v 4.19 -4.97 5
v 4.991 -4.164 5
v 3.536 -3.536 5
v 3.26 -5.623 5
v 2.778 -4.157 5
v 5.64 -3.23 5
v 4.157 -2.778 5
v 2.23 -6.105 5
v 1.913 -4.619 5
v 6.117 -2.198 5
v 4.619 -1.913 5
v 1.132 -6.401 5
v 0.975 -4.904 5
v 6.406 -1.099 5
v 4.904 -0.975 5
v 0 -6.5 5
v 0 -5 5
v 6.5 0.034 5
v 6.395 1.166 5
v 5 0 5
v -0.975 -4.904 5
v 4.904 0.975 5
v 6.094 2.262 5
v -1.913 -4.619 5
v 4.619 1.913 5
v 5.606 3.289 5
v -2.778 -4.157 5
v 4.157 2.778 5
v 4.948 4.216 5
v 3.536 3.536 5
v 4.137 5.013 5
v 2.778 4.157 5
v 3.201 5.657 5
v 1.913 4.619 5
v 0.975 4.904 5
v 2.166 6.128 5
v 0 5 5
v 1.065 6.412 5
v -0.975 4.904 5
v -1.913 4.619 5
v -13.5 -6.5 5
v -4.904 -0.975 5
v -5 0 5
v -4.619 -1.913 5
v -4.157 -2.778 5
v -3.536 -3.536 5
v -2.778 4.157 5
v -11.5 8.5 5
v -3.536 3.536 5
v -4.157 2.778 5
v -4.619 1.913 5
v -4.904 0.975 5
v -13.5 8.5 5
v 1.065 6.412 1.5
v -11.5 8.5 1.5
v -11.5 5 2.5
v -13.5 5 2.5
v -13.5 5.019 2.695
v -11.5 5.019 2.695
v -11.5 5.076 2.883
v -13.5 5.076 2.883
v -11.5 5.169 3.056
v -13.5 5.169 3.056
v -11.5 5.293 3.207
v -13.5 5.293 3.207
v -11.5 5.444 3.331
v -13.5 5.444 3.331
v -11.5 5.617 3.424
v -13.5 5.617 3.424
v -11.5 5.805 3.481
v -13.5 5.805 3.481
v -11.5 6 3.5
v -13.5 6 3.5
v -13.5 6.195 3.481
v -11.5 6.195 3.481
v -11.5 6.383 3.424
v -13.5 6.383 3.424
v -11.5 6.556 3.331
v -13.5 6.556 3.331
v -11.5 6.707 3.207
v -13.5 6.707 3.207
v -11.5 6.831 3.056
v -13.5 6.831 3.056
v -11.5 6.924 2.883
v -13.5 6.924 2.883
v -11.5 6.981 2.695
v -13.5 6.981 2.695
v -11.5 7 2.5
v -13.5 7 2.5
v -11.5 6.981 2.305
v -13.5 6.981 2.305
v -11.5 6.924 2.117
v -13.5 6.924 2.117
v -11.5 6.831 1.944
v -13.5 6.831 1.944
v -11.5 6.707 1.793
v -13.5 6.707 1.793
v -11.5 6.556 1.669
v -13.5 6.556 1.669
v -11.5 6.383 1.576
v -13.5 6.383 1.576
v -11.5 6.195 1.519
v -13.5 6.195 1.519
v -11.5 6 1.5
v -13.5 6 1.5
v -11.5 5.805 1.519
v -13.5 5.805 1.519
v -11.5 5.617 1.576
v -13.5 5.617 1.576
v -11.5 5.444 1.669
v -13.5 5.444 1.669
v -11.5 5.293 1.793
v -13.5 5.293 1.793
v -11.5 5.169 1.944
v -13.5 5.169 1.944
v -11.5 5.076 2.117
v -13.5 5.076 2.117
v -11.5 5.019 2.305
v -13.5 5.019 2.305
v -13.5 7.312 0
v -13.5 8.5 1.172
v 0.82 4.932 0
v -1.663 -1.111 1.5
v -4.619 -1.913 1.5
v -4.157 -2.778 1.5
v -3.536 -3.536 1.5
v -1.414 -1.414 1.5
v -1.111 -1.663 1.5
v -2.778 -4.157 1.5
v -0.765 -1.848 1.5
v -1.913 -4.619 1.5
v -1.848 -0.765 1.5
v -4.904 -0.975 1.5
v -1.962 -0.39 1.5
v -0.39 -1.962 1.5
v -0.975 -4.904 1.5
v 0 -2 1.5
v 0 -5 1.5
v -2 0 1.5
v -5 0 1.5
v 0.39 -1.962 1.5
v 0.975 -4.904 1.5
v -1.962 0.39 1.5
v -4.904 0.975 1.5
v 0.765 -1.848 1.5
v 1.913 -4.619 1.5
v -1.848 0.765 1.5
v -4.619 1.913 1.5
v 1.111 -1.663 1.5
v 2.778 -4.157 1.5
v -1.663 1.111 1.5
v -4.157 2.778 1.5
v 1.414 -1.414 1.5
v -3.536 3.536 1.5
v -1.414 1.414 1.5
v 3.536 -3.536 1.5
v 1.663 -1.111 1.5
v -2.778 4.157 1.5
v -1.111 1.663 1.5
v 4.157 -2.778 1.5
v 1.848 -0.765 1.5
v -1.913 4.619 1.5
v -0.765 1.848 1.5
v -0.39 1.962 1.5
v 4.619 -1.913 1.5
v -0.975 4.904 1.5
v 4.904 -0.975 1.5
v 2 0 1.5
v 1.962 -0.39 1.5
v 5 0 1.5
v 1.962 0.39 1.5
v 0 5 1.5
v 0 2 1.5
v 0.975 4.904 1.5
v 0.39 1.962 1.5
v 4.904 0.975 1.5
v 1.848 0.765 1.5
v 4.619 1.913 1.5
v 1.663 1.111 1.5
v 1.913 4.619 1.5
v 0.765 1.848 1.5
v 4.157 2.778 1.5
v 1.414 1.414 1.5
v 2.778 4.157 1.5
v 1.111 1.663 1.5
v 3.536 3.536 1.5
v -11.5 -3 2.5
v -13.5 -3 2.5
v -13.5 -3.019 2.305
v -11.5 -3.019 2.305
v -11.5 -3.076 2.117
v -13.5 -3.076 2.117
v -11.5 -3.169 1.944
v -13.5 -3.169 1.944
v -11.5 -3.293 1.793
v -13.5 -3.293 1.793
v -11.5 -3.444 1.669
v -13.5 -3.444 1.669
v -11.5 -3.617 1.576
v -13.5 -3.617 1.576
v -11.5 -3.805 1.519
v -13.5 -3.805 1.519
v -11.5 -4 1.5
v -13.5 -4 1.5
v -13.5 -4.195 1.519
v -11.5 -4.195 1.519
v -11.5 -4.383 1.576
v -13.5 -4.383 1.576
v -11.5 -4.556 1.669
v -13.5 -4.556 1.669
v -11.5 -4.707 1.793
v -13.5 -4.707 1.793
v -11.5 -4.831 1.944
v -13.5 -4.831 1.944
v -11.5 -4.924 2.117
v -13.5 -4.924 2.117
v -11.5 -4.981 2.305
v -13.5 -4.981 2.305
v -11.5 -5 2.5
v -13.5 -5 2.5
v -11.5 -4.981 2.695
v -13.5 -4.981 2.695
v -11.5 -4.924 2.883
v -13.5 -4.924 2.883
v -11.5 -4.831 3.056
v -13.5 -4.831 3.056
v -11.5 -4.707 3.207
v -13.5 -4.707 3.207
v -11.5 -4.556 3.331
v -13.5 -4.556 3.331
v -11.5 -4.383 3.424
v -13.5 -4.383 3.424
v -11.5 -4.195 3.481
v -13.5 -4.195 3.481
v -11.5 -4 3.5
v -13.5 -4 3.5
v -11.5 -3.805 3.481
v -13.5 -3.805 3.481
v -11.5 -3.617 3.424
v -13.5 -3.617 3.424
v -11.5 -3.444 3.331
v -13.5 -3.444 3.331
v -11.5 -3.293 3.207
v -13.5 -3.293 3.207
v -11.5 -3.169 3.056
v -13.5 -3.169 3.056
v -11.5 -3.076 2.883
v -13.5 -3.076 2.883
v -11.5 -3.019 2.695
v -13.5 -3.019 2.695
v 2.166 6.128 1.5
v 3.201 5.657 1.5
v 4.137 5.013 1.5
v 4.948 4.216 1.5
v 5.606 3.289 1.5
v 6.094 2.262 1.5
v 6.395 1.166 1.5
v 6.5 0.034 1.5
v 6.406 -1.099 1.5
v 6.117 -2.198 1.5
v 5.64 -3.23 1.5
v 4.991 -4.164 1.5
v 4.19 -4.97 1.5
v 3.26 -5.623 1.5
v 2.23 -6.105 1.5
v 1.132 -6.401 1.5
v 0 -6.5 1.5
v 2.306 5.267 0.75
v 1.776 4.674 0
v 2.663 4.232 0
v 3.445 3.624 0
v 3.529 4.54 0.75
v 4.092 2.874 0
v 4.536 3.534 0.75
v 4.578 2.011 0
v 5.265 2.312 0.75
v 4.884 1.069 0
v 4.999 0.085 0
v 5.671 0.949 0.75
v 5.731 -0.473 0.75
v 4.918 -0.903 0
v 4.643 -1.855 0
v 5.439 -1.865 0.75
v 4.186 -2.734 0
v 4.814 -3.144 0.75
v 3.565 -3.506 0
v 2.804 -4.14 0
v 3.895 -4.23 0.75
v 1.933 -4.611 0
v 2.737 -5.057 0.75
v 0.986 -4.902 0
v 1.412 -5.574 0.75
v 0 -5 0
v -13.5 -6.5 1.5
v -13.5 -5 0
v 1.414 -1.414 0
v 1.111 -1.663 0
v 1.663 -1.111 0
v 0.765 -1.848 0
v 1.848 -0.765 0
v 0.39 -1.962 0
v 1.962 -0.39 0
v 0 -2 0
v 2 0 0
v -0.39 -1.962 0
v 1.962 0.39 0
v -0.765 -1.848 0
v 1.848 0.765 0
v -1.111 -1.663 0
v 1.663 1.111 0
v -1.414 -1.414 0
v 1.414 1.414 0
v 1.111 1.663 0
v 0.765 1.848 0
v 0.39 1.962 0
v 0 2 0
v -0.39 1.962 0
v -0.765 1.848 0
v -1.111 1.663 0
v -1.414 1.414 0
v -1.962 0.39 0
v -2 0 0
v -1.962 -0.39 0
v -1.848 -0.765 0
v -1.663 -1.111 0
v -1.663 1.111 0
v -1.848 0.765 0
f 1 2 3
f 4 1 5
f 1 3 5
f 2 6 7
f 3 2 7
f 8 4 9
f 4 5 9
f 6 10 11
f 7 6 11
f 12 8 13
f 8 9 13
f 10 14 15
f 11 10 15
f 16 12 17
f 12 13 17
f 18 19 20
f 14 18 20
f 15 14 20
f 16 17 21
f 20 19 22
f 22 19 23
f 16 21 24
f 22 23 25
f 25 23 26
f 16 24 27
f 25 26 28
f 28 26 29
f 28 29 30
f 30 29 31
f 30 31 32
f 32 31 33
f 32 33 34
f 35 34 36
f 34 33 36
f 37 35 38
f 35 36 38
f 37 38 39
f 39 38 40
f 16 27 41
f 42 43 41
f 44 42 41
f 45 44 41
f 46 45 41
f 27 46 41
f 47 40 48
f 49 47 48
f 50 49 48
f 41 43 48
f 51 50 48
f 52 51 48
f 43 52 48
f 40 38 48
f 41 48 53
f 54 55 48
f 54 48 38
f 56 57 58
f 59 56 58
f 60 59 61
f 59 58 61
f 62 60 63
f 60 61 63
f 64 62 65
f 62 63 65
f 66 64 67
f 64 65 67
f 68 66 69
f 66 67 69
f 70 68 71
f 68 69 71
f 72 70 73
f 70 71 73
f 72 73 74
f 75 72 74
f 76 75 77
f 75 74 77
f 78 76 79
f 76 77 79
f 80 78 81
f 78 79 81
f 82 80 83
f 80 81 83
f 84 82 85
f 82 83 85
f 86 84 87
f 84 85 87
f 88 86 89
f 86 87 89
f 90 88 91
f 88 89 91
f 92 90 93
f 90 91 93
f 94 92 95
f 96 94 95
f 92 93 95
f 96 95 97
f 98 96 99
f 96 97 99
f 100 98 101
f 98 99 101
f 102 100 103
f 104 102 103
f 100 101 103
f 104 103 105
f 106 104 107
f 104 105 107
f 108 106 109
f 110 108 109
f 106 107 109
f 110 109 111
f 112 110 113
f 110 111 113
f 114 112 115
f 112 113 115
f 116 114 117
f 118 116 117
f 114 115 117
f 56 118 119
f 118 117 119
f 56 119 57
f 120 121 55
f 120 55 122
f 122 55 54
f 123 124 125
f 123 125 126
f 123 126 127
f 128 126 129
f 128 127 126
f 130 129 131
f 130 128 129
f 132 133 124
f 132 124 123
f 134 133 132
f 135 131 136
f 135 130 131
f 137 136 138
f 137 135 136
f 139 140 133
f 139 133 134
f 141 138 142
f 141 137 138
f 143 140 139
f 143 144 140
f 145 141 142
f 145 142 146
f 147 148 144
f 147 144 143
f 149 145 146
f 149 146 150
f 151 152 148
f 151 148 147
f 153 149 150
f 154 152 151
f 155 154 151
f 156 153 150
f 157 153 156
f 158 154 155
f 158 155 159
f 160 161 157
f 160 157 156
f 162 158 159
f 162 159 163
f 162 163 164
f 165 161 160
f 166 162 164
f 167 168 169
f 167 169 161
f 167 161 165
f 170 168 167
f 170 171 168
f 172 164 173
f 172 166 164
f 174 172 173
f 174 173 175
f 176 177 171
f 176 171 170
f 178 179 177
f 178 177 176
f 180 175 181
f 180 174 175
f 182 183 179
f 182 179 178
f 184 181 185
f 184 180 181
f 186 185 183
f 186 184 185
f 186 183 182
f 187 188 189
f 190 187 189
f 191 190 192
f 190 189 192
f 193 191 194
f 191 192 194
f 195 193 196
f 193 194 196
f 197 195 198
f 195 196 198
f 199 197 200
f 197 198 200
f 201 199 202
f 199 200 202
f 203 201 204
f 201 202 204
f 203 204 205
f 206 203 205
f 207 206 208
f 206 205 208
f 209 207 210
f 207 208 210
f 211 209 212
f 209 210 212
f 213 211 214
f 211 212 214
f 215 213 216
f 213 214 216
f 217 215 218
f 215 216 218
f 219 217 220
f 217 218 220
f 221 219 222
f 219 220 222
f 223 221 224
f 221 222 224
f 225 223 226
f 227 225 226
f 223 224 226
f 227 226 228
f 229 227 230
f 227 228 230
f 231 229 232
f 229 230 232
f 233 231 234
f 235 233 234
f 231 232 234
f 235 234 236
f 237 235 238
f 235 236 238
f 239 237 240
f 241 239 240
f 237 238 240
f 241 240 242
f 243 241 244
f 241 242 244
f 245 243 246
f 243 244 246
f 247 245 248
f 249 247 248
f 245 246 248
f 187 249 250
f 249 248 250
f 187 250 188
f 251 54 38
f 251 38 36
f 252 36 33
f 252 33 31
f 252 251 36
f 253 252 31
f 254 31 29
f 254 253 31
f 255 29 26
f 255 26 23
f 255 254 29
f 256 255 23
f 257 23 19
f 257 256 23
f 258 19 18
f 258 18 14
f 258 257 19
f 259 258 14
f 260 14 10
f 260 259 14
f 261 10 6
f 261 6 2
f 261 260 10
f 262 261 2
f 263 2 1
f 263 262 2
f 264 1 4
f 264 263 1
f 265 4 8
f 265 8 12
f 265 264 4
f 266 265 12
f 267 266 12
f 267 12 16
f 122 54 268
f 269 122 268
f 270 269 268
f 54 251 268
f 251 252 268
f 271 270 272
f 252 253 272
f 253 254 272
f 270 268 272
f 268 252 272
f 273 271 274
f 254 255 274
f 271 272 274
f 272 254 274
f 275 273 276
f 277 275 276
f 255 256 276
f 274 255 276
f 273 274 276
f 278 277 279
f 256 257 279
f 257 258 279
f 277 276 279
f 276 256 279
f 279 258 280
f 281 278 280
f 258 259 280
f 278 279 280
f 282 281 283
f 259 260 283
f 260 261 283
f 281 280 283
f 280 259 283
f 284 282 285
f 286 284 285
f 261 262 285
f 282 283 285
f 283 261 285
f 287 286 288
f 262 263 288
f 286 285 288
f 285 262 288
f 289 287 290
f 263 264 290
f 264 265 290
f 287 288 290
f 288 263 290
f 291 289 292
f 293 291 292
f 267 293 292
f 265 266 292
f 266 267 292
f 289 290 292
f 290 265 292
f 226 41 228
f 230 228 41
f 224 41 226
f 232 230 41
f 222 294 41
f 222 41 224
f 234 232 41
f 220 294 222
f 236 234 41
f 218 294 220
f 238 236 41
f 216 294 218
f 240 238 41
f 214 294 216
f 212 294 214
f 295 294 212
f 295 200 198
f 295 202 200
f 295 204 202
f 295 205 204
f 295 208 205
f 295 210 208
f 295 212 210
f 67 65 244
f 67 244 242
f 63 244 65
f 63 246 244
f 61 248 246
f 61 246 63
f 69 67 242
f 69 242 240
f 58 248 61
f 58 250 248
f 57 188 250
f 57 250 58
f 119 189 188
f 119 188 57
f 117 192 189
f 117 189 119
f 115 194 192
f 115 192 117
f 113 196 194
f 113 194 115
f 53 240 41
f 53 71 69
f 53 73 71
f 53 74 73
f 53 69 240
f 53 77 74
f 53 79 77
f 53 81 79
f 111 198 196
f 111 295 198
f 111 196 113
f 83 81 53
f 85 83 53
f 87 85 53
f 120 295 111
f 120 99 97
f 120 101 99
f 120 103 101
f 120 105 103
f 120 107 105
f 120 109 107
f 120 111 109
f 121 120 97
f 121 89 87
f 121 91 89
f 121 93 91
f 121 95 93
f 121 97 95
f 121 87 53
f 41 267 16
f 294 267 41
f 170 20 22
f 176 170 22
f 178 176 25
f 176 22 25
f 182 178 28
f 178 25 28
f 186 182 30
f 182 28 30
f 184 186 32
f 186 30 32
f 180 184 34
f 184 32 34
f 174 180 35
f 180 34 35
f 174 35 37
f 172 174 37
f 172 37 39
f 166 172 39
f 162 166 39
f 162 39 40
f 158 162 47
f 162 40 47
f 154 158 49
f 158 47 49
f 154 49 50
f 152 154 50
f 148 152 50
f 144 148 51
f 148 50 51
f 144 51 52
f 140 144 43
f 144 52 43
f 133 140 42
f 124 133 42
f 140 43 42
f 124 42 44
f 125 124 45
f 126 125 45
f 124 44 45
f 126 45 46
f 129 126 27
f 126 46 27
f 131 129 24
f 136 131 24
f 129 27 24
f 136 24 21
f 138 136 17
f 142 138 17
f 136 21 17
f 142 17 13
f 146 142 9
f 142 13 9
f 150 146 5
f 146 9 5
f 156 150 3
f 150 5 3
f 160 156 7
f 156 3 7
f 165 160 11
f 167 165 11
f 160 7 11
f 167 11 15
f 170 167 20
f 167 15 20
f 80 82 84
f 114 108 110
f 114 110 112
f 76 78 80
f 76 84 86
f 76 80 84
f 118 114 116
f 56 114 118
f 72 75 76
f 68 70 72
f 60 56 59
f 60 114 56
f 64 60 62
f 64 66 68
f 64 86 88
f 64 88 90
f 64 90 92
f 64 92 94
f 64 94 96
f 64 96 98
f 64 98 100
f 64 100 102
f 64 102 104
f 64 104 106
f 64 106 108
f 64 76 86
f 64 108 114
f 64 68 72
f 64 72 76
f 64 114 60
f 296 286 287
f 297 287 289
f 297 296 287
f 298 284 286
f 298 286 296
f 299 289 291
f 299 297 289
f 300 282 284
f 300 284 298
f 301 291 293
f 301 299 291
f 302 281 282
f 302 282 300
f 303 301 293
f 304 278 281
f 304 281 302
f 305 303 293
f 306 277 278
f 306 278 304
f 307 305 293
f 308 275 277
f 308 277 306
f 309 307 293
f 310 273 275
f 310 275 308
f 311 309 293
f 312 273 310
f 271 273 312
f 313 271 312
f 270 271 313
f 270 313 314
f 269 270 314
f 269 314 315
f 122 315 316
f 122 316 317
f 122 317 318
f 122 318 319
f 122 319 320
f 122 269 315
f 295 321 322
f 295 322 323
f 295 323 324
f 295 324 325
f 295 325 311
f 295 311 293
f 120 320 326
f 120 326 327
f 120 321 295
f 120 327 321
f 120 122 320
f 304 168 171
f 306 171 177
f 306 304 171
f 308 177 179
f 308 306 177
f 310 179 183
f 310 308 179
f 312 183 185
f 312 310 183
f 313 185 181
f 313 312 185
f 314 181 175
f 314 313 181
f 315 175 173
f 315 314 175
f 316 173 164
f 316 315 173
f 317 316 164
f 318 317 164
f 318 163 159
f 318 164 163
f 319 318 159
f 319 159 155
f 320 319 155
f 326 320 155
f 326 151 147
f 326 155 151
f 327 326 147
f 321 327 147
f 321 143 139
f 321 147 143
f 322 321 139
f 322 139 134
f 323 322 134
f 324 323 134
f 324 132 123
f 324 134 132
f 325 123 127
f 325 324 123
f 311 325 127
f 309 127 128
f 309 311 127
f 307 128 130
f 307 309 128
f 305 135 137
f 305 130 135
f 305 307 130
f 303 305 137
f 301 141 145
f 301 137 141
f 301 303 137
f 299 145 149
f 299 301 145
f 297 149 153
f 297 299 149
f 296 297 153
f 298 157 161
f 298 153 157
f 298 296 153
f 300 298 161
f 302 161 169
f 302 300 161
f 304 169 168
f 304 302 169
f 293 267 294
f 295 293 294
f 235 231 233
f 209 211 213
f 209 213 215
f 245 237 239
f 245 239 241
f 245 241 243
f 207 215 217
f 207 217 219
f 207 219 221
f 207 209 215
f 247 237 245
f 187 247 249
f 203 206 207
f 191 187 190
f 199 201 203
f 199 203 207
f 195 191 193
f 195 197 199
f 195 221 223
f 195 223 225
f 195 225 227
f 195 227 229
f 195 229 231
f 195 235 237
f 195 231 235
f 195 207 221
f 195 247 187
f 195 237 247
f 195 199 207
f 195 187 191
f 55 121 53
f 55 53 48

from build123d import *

# Parameters (mm, degrees)
SKETCH1_R           = 2
BOSS_EXTRUDE1_DEPTH = 5
SKETCH2_R           = 5
CUT_EXTRUDE1_DEPTH  = 3.5
SKETCH3_R           = 1
CUT_EXTRUDE2_DEPTH  = 2
CHAMFER1_SIZE       = 1.5


with BuildPart() as part:
    # Sketch1 → Boss-Extrude1 (new body)
    with BuildSketch(Plane.XY):
        with BuildLine():
            Line((0, -6.5), (-13.5, -6.5))
            Line((-13.5, -6.5), (-13.5, 8.5))
            Line((-13.5, 8.5), (-11.5, 8.5))
            Line((-11.5, 8.5), (1.065452768, 6.412083156))
            ThreePointArc((1.065452768, 6.412083156), (6.477983502, -0.534536942), (0, -6.5))
        make_face()
        Circle(SKETCH1_R, mode=Mode.SUBTRACT)
    extrude(amount=BOSS_EXTRUDE1_DEPTH)

    # Sketch2 → Cut-Extrude1 (cut)
    with BuildSketch(Plane.XY.offset(5)):
        Circle(SKETCH2_R)
    extrude(amount=-CUT_EXTRUDE1_DEPTH, mode=Mode.SUBTRACT)

    # Sketch3 → Cut-Extrude2 (cut)
    with BuildSketch(Plane.ZY.offset(13.5)):
        with Locations(Location((2.5, 6, 0), (0, 0, 270))):
            Circle(SKETCH3_R)
        with Locations(Location((2.5, -4, 0), (0, 0, 90))):
            Circle(SKETCH3_R)
    extrude(amount=-CUT_EXTRUDE2_DEPTH, mode=Mode.SUBTRACT)

    # Chamfer1
    chamfer1_edges = [part.edges().sort_by_distance(p)[0] for p in [
        (-5.217273616, 7.456041578, 0),
        (6.477983502, -0.534536942, 0),
        (-6.75, -6.5, 0),
    ]]
    chamfer(chamfer1_edges, length=CHAMFER1_SIZE)


solid = part.part
